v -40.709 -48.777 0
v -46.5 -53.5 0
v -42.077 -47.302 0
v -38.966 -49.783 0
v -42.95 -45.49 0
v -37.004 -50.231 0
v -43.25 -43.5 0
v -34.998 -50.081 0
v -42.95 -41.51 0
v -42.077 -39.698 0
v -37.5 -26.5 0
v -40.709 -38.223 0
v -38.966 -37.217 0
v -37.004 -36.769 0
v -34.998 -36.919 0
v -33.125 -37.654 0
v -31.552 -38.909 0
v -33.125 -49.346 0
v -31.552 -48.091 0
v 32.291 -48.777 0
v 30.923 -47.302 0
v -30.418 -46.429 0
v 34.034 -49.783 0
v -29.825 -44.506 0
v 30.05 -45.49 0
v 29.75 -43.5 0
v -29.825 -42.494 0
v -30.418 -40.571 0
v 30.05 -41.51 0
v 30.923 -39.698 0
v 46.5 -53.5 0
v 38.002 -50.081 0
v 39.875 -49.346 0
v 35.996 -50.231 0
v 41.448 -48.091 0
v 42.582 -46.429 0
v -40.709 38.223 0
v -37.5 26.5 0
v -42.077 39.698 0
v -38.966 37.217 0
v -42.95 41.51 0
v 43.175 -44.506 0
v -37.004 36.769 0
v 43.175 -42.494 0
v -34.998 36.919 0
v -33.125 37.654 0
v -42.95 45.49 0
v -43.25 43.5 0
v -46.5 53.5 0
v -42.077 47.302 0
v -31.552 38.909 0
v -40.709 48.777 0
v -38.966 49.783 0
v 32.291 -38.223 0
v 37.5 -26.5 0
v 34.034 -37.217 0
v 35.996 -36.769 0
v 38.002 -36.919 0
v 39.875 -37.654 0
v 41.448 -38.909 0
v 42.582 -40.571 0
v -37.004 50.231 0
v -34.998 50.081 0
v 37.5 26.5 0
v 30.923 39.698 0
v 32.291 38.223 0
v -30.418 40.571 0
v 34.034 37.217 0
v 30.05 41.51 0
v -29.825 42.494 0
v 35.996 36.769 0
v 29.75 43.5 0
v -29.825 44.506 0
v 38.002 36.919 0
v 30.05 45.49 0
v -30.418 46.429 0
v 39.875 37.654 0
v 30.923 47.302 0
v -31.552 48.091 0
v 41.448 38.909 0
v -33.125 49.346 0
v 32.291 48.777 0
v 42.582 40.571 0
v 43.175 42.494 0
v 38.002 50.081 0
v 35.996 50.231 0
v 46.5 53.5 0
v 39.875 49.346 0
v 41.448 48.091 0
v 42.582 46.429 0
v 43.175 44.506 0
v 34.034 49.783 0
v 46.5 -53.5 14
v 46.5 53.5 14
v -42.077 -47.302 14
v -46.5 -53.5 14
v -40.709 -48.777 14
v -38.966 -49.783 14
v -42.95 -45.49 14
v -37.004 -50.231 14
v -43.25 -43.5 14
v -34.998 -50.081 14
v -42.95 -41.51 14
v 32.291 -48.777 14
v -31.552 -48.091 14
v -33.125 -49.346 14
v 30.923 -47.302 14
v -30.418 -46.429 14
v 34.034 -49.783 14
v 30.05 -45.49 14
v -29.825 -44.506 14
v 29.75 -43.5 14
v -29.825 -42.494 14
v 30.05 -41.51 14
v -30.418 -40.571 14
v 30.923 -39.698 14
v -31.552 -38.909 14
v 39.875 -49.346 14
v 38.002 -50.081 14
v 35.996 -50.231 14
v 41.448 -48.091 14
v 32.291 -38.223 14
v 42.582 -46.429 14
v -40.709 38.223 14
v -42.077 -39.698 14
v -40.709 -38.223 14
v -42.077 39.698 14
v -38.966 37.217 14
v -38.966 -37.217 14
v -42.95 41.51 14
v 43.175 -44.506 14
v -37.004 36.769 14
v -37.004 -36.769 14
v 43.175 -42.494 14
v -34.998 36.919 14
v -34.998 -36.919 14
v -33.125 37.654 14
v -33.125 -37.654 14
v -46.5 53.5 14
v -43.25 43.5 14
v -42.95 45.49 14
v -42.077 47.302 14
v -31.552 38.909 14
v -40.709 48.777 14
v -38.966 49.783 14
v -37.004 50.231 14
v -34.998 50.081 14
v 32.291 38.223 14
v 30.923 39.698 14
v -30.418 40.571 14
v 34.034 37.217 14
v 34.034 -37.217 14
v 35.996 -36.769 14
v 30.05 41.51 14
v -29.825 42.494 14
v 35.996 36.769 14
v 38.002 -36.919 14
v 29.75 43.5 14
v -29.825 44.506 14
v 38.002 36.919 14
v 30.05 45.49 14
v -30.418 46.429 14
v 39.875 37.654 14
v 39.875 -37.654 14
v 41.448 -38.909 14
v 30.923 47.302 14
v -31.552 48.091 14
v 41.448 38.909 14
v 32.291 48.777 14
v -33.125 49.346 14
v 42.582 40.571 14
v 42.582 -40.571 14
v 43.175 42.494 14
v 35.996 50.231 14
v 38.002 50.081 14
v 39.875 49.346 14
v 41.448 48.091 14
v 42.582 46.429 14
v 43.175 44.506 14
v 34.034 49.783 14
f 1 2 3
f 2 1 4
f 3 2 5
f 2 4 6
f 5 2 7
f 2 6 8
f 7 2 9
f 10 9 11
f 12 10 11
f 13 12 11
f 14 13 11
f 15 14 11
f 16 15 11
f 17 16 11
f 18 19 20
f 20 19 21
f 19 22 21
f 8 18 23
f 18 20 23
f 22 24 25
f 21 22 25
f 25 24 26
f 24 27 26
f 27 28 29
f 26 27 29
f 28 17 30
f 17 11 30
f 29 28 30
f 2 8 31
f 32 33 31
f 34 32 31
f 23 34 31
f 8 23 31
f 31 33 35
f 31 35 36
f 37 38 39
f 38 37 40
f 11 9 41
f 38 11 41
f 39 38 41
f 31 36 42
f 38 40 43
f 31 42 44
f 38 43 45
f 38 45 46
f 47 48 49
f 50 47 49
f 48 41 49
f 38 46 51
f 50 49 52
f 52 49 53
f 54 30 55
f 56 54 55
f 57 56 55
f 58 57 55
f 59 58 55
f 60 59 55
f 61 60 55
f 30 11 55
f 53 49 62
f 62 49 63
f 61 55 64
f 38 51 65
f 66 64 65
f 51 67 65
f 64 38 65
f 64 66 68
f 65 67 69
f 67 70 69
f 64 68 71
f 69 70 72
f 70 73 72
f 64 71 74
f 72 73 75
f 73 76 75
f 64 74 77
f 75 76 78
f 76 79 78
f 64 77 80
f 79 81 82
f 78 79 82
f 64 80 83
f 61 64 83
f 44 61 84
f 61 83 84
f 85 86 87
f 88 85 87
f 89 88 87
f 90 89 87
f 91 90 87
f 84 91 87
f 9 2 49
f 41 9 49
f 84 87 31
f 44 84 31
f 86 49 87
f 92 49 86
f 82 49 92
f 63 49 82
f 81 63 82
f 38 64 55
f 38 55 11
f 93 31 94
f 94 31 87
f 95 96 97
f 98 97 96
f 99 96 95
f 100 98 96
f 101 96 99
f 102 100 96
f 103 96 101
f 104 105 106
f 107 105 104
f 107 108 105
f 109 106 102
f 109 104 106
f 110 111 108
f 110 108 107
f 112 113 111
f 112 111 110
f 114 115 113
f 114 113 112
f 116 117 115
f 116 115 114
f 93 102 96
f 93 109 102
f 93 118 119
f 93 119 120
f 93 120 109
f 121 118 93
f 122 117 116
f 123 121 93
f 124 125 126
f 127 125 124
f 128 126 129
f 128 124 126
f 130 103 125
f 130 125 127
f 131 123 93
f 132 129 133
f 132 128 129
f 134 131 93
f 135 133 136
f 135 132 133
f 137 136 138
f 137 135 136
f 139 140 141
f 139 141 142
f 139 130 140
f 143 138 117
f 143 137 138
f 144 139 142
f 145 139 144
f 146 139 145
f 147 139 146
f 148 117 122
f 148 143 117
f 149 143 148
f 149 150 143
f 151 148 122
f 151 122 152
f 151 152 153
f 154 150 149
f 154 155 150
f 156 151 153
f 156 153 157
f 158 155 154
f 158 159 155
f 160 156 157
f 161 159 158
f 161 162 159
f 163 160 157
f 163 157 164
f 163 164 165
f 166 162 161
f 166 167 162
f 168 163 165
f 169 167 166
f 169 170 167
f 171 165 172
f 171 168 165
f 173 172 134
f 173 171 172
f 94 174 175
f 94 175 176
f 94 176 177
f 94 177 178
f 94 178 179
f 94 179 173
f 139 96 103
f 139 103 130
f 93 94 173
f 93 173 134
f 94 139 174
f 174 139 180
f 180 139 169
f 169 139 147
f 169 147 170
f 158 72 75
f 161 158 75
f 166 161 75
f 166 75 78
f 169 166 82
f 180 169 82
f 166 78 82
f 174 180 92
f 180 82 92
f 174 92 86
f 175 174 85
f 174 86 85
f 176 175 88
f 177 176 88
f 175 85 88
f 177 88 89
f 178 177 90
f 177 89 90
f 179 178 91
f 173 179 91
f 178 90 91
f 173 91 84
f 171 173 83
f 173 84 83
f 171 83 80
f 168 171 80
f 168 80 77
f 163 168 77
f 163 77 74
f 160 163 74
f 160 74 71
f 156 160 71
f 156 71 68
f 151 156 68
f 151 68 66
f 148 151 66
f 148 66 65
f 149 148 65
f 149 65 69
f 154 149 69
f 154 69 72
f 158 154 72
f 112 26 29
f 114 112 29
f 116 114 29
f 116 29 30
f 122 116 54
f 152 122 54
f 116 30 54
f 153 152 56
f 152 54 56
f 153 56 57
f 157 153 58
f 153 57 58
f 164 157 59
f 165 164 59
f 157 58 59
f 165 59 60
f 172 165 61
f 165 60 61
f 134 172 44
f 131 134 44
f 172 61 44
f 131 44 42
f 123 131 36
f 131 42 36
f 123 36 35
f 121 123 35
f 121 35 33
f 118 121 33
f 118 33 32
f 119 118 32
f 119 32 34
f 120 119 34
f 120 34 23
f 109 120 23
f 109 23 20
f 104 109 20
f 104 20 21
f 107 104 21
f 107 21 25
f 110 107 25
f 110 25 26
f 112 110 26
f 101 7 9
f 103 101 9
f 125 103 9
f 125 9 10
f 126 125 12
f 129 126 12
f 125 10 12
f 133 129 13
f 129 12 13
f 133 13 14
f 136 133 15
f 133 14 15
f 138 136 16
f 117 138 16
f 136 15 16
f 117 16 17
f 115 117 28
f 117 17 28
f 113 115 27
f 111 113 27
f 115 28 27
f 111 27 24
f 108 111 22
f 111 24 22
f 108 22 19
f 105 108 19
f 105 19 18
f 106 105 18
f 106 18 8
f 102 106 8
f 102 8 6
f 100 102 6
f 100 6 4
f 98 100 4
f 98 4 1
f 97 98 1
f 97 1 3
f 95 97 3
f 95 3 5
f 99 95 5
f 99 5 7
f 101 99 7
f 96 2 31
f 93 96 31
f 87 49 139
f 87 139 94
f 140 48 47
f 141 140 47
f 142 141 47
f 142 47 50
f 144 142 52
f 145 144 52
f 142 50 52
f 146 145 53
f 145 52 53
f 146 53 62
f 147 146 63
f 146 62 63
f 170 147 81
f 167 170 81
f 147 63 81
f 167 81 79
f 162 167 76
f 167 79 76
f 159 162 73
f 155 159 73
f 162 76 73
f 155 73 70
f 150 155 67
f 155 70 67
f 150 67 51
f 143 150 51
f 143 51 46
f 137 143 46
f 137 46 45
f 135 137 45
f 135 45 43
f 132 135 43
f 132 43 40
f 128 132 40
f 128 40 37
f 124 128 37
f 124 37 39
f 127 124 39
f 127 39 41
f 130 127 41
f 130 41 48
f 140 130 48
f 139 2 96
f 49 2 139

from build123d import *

# Parameters (mm, degrees)
SKICA1_W                 = 93
SKICA1_H                 = 107
P_IDAT_VYSUNUT_M1_DEPTH  = 14
SKICA2_R                 = 6.75
ODEBRAT_VYSUNUT_M1_DEPTH = 15
SKICA4_W                 = 75
SKICA4_H                 = 53
ODEBRAT_VYSUNUT_M2_DEPTH = 0.0001


with BuildPart() as part:
    # Skica1 → Přidat vysunutím1 (new body)
    with BuildSketch(Plane.XY):
        Rectangle(SKICA1_W, SKICA1_H)
    extrude(amount=P_IDAT_VYSUNUT_M1_DEPTH)

    # Skica2 → Odebrat vysunutím1 (cut, through all)
    with BuildSketch(Plane(origin=(0, 0, 0), x_dir=(-1, 0, 0), z_dir=(0, 0, -1))):
        with Locations((-36.5, 43.5)):
            Circle(SKICA2_R)
        with Locations((36.5, 43.5)):
            Circle(SKICA2_R)
        with Locations((36.5, -43.5)):
            Circle(SKICA2_R)
        with Locations((-36.5, -43.5)):
            Circle(SKICA2_R)
    extrude(amount=-ODEBRAT_VYSUNUT_M1_DEPTH, mode=Mode.SUBTRACT)

    # Skica4 → Odebrat vysunutím2 (cut)
    with BuildSketch(Plane(origin=(0, 0, 0), x_dir=(-1, 0, 0), z_dir=(0, 0, -1))):
        Rectangle(SKICA4_W, SKICA4_H)
    extrude(amount=-ODEBRAT_VYSUNUT_M2_DEPTH, mode=Mode.SUBTRACT)


solid = part.part
